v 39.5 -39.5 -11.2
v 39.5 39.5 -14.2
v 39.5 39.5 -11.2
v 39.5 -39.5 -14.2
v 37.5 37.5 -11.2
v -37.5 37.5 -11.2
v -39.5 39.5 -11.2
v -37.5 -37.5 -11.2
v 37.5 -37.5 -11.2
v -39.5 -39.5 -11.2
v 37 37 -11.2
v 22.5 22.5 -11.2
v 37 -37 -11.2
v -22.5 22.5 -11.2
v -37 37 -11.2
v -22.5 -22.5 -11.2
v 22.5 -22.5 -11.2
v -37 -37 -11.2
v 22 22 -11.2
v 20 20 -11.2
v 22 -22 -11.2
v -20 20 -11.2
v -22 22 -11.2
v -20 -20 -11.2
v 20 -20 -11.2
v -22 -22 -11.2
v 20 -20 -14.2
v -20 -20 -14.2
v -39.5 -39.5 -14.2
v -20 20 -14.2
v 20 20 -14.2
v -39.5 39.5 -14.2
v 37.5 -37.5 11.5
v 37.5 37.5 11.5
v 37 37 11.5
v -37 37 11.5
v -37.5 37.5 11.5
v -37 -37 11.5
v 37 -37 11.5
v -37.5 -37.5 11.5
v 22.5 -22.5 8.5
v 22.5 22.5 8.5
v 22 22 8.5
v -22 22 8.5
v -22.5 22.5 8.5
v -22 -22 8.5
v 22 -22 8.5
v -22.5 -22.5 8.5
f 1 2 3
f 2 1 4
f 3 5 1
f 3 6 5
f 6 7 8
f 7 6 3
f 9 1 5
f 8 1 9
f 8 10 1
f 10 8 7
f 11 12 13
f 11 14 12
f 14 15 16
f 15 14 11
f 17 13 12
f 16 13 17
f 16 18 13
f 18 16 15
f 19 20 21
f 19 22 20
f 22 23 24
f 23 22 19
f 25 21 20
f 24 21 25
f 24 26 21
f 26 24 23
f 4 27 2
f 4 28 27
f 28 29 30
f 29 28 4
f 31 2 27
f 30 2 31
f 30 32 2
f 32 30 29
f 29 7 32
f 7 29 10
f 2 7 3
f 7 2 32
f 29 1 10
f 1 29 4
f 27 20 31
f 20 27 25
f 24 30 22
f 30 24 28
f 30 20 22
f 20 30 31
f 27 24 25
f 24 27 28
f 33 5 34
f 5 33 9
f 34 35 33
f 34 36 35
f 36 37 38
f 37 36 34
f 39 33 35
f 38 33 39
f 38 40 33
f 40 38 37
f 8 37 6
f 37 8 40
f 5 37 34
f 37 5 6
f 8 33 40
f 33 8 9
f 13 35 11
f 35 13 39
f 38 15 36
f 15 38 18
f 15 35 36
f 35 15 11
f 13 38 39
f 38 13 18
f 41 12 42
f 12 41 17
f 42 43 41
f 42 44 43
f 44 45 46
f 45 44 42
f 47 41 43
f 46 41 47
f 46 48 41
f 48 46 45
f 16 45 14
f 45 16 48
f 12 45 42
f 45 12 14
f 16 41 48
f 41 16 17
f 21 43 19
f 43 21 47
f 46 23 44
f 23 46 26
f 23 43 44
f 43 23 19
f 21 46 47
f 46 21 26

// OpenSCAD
// [FL_INDEX: keywords="openscad, 3d_parametric, xxx, csg_solid" | COT="Parametric OpenSCAD design from 3DCodeverse"]
// Title: xxx

// Copyright (c) 2013, 2014 by Jean-Louis Paquelin (jlp6k).
// This work is licensed under the Creative Commons Attribution
// Partage dans les Mêmes Conditions 3.0 France License.
// To view a copy of this license, visit http://creativecommons.org/licenses/by-sa/3.0/fr/
// CC-BY-SA

// Created 2013-11-29
// Last modified 2014-02-15

// dimensions are set in millimeters

Has_Inner_Cutter = "yes"; // [yes:Output will have an inner cutter, no: simple cookie cutter]

Cutter_Thickness = 0.5;

Outer_Side = 75;
Outer_Height = 23;

Inner_Side_Difference = 15;
Inner_Height_Difference = 3;

Frame_Thickness = 3;
Frame_Flange = 2;

union() {
    // grip / frame
    translate([0, 0, -(Outer_Height / 2) - (Frame_Thickness / 2) + (Frame_Thickness / 10)])
        difference() {
            cube([Outer_Side + Frame_Flange * 2,
                  Outer_Side + Frame_Flange * 2,
                  Frame_Thickness],
                  center = true);

            if(Has_Inner_Cutter == "yes") {
                cube([Outer_Side - Inner_Side_Difference * 2 - Cutter_Thickness * 2 - Frame_Flange * 2,
                      Outer_Side - Inner_Side_Difference * 2 - Cutter_Thickness * 2 - Frame_Flange * 2,
                      Frame_Thickness + 1],
                      center = true);
            } else {
                cube([Outer_Side - Cutter_Thickness * 2 - Frame_Flange * 2,
                      Outer_Side - Cutter_Thickness * 2 - Frame_Flange * 2,
                      Frame_Thickness + 1],
                      center = true);

            }
        }

    // outer cutter
    difference() {
        cube([Outer_Side,
              Outer_Side,
              Outer_Height],
              center = true);
        cube([Outer_Side - Cutter_Thickness * 2,
              Outer_Side - Cutter_Thickness * 2,
              Outer_Height + 10],
              center = true);
    }


    if(Has_Inner_Cutter == "yes") {
        // inner cutter
        translate([0, 0,  -Inner_Height_Difference / 2])
            difference() {
                cube([Outer_Side - Inner_Side_Difference * 2,
                      Outer_Side - Inner_Side_Difference * 2,
                      Outer_Height - Inner_Height_Difference],
                      center = true);
                cube([Outer_Side - Inner_Side_Difference * 2 - Cutter_Thickness * 2,
                      Outer_Side - Inner_Side_Difference * 2 - Cutter_Thickness * 2,
                      Outer_Height - Inner_Height_Difference + 10],
                      center = true);
            }
    }
}
